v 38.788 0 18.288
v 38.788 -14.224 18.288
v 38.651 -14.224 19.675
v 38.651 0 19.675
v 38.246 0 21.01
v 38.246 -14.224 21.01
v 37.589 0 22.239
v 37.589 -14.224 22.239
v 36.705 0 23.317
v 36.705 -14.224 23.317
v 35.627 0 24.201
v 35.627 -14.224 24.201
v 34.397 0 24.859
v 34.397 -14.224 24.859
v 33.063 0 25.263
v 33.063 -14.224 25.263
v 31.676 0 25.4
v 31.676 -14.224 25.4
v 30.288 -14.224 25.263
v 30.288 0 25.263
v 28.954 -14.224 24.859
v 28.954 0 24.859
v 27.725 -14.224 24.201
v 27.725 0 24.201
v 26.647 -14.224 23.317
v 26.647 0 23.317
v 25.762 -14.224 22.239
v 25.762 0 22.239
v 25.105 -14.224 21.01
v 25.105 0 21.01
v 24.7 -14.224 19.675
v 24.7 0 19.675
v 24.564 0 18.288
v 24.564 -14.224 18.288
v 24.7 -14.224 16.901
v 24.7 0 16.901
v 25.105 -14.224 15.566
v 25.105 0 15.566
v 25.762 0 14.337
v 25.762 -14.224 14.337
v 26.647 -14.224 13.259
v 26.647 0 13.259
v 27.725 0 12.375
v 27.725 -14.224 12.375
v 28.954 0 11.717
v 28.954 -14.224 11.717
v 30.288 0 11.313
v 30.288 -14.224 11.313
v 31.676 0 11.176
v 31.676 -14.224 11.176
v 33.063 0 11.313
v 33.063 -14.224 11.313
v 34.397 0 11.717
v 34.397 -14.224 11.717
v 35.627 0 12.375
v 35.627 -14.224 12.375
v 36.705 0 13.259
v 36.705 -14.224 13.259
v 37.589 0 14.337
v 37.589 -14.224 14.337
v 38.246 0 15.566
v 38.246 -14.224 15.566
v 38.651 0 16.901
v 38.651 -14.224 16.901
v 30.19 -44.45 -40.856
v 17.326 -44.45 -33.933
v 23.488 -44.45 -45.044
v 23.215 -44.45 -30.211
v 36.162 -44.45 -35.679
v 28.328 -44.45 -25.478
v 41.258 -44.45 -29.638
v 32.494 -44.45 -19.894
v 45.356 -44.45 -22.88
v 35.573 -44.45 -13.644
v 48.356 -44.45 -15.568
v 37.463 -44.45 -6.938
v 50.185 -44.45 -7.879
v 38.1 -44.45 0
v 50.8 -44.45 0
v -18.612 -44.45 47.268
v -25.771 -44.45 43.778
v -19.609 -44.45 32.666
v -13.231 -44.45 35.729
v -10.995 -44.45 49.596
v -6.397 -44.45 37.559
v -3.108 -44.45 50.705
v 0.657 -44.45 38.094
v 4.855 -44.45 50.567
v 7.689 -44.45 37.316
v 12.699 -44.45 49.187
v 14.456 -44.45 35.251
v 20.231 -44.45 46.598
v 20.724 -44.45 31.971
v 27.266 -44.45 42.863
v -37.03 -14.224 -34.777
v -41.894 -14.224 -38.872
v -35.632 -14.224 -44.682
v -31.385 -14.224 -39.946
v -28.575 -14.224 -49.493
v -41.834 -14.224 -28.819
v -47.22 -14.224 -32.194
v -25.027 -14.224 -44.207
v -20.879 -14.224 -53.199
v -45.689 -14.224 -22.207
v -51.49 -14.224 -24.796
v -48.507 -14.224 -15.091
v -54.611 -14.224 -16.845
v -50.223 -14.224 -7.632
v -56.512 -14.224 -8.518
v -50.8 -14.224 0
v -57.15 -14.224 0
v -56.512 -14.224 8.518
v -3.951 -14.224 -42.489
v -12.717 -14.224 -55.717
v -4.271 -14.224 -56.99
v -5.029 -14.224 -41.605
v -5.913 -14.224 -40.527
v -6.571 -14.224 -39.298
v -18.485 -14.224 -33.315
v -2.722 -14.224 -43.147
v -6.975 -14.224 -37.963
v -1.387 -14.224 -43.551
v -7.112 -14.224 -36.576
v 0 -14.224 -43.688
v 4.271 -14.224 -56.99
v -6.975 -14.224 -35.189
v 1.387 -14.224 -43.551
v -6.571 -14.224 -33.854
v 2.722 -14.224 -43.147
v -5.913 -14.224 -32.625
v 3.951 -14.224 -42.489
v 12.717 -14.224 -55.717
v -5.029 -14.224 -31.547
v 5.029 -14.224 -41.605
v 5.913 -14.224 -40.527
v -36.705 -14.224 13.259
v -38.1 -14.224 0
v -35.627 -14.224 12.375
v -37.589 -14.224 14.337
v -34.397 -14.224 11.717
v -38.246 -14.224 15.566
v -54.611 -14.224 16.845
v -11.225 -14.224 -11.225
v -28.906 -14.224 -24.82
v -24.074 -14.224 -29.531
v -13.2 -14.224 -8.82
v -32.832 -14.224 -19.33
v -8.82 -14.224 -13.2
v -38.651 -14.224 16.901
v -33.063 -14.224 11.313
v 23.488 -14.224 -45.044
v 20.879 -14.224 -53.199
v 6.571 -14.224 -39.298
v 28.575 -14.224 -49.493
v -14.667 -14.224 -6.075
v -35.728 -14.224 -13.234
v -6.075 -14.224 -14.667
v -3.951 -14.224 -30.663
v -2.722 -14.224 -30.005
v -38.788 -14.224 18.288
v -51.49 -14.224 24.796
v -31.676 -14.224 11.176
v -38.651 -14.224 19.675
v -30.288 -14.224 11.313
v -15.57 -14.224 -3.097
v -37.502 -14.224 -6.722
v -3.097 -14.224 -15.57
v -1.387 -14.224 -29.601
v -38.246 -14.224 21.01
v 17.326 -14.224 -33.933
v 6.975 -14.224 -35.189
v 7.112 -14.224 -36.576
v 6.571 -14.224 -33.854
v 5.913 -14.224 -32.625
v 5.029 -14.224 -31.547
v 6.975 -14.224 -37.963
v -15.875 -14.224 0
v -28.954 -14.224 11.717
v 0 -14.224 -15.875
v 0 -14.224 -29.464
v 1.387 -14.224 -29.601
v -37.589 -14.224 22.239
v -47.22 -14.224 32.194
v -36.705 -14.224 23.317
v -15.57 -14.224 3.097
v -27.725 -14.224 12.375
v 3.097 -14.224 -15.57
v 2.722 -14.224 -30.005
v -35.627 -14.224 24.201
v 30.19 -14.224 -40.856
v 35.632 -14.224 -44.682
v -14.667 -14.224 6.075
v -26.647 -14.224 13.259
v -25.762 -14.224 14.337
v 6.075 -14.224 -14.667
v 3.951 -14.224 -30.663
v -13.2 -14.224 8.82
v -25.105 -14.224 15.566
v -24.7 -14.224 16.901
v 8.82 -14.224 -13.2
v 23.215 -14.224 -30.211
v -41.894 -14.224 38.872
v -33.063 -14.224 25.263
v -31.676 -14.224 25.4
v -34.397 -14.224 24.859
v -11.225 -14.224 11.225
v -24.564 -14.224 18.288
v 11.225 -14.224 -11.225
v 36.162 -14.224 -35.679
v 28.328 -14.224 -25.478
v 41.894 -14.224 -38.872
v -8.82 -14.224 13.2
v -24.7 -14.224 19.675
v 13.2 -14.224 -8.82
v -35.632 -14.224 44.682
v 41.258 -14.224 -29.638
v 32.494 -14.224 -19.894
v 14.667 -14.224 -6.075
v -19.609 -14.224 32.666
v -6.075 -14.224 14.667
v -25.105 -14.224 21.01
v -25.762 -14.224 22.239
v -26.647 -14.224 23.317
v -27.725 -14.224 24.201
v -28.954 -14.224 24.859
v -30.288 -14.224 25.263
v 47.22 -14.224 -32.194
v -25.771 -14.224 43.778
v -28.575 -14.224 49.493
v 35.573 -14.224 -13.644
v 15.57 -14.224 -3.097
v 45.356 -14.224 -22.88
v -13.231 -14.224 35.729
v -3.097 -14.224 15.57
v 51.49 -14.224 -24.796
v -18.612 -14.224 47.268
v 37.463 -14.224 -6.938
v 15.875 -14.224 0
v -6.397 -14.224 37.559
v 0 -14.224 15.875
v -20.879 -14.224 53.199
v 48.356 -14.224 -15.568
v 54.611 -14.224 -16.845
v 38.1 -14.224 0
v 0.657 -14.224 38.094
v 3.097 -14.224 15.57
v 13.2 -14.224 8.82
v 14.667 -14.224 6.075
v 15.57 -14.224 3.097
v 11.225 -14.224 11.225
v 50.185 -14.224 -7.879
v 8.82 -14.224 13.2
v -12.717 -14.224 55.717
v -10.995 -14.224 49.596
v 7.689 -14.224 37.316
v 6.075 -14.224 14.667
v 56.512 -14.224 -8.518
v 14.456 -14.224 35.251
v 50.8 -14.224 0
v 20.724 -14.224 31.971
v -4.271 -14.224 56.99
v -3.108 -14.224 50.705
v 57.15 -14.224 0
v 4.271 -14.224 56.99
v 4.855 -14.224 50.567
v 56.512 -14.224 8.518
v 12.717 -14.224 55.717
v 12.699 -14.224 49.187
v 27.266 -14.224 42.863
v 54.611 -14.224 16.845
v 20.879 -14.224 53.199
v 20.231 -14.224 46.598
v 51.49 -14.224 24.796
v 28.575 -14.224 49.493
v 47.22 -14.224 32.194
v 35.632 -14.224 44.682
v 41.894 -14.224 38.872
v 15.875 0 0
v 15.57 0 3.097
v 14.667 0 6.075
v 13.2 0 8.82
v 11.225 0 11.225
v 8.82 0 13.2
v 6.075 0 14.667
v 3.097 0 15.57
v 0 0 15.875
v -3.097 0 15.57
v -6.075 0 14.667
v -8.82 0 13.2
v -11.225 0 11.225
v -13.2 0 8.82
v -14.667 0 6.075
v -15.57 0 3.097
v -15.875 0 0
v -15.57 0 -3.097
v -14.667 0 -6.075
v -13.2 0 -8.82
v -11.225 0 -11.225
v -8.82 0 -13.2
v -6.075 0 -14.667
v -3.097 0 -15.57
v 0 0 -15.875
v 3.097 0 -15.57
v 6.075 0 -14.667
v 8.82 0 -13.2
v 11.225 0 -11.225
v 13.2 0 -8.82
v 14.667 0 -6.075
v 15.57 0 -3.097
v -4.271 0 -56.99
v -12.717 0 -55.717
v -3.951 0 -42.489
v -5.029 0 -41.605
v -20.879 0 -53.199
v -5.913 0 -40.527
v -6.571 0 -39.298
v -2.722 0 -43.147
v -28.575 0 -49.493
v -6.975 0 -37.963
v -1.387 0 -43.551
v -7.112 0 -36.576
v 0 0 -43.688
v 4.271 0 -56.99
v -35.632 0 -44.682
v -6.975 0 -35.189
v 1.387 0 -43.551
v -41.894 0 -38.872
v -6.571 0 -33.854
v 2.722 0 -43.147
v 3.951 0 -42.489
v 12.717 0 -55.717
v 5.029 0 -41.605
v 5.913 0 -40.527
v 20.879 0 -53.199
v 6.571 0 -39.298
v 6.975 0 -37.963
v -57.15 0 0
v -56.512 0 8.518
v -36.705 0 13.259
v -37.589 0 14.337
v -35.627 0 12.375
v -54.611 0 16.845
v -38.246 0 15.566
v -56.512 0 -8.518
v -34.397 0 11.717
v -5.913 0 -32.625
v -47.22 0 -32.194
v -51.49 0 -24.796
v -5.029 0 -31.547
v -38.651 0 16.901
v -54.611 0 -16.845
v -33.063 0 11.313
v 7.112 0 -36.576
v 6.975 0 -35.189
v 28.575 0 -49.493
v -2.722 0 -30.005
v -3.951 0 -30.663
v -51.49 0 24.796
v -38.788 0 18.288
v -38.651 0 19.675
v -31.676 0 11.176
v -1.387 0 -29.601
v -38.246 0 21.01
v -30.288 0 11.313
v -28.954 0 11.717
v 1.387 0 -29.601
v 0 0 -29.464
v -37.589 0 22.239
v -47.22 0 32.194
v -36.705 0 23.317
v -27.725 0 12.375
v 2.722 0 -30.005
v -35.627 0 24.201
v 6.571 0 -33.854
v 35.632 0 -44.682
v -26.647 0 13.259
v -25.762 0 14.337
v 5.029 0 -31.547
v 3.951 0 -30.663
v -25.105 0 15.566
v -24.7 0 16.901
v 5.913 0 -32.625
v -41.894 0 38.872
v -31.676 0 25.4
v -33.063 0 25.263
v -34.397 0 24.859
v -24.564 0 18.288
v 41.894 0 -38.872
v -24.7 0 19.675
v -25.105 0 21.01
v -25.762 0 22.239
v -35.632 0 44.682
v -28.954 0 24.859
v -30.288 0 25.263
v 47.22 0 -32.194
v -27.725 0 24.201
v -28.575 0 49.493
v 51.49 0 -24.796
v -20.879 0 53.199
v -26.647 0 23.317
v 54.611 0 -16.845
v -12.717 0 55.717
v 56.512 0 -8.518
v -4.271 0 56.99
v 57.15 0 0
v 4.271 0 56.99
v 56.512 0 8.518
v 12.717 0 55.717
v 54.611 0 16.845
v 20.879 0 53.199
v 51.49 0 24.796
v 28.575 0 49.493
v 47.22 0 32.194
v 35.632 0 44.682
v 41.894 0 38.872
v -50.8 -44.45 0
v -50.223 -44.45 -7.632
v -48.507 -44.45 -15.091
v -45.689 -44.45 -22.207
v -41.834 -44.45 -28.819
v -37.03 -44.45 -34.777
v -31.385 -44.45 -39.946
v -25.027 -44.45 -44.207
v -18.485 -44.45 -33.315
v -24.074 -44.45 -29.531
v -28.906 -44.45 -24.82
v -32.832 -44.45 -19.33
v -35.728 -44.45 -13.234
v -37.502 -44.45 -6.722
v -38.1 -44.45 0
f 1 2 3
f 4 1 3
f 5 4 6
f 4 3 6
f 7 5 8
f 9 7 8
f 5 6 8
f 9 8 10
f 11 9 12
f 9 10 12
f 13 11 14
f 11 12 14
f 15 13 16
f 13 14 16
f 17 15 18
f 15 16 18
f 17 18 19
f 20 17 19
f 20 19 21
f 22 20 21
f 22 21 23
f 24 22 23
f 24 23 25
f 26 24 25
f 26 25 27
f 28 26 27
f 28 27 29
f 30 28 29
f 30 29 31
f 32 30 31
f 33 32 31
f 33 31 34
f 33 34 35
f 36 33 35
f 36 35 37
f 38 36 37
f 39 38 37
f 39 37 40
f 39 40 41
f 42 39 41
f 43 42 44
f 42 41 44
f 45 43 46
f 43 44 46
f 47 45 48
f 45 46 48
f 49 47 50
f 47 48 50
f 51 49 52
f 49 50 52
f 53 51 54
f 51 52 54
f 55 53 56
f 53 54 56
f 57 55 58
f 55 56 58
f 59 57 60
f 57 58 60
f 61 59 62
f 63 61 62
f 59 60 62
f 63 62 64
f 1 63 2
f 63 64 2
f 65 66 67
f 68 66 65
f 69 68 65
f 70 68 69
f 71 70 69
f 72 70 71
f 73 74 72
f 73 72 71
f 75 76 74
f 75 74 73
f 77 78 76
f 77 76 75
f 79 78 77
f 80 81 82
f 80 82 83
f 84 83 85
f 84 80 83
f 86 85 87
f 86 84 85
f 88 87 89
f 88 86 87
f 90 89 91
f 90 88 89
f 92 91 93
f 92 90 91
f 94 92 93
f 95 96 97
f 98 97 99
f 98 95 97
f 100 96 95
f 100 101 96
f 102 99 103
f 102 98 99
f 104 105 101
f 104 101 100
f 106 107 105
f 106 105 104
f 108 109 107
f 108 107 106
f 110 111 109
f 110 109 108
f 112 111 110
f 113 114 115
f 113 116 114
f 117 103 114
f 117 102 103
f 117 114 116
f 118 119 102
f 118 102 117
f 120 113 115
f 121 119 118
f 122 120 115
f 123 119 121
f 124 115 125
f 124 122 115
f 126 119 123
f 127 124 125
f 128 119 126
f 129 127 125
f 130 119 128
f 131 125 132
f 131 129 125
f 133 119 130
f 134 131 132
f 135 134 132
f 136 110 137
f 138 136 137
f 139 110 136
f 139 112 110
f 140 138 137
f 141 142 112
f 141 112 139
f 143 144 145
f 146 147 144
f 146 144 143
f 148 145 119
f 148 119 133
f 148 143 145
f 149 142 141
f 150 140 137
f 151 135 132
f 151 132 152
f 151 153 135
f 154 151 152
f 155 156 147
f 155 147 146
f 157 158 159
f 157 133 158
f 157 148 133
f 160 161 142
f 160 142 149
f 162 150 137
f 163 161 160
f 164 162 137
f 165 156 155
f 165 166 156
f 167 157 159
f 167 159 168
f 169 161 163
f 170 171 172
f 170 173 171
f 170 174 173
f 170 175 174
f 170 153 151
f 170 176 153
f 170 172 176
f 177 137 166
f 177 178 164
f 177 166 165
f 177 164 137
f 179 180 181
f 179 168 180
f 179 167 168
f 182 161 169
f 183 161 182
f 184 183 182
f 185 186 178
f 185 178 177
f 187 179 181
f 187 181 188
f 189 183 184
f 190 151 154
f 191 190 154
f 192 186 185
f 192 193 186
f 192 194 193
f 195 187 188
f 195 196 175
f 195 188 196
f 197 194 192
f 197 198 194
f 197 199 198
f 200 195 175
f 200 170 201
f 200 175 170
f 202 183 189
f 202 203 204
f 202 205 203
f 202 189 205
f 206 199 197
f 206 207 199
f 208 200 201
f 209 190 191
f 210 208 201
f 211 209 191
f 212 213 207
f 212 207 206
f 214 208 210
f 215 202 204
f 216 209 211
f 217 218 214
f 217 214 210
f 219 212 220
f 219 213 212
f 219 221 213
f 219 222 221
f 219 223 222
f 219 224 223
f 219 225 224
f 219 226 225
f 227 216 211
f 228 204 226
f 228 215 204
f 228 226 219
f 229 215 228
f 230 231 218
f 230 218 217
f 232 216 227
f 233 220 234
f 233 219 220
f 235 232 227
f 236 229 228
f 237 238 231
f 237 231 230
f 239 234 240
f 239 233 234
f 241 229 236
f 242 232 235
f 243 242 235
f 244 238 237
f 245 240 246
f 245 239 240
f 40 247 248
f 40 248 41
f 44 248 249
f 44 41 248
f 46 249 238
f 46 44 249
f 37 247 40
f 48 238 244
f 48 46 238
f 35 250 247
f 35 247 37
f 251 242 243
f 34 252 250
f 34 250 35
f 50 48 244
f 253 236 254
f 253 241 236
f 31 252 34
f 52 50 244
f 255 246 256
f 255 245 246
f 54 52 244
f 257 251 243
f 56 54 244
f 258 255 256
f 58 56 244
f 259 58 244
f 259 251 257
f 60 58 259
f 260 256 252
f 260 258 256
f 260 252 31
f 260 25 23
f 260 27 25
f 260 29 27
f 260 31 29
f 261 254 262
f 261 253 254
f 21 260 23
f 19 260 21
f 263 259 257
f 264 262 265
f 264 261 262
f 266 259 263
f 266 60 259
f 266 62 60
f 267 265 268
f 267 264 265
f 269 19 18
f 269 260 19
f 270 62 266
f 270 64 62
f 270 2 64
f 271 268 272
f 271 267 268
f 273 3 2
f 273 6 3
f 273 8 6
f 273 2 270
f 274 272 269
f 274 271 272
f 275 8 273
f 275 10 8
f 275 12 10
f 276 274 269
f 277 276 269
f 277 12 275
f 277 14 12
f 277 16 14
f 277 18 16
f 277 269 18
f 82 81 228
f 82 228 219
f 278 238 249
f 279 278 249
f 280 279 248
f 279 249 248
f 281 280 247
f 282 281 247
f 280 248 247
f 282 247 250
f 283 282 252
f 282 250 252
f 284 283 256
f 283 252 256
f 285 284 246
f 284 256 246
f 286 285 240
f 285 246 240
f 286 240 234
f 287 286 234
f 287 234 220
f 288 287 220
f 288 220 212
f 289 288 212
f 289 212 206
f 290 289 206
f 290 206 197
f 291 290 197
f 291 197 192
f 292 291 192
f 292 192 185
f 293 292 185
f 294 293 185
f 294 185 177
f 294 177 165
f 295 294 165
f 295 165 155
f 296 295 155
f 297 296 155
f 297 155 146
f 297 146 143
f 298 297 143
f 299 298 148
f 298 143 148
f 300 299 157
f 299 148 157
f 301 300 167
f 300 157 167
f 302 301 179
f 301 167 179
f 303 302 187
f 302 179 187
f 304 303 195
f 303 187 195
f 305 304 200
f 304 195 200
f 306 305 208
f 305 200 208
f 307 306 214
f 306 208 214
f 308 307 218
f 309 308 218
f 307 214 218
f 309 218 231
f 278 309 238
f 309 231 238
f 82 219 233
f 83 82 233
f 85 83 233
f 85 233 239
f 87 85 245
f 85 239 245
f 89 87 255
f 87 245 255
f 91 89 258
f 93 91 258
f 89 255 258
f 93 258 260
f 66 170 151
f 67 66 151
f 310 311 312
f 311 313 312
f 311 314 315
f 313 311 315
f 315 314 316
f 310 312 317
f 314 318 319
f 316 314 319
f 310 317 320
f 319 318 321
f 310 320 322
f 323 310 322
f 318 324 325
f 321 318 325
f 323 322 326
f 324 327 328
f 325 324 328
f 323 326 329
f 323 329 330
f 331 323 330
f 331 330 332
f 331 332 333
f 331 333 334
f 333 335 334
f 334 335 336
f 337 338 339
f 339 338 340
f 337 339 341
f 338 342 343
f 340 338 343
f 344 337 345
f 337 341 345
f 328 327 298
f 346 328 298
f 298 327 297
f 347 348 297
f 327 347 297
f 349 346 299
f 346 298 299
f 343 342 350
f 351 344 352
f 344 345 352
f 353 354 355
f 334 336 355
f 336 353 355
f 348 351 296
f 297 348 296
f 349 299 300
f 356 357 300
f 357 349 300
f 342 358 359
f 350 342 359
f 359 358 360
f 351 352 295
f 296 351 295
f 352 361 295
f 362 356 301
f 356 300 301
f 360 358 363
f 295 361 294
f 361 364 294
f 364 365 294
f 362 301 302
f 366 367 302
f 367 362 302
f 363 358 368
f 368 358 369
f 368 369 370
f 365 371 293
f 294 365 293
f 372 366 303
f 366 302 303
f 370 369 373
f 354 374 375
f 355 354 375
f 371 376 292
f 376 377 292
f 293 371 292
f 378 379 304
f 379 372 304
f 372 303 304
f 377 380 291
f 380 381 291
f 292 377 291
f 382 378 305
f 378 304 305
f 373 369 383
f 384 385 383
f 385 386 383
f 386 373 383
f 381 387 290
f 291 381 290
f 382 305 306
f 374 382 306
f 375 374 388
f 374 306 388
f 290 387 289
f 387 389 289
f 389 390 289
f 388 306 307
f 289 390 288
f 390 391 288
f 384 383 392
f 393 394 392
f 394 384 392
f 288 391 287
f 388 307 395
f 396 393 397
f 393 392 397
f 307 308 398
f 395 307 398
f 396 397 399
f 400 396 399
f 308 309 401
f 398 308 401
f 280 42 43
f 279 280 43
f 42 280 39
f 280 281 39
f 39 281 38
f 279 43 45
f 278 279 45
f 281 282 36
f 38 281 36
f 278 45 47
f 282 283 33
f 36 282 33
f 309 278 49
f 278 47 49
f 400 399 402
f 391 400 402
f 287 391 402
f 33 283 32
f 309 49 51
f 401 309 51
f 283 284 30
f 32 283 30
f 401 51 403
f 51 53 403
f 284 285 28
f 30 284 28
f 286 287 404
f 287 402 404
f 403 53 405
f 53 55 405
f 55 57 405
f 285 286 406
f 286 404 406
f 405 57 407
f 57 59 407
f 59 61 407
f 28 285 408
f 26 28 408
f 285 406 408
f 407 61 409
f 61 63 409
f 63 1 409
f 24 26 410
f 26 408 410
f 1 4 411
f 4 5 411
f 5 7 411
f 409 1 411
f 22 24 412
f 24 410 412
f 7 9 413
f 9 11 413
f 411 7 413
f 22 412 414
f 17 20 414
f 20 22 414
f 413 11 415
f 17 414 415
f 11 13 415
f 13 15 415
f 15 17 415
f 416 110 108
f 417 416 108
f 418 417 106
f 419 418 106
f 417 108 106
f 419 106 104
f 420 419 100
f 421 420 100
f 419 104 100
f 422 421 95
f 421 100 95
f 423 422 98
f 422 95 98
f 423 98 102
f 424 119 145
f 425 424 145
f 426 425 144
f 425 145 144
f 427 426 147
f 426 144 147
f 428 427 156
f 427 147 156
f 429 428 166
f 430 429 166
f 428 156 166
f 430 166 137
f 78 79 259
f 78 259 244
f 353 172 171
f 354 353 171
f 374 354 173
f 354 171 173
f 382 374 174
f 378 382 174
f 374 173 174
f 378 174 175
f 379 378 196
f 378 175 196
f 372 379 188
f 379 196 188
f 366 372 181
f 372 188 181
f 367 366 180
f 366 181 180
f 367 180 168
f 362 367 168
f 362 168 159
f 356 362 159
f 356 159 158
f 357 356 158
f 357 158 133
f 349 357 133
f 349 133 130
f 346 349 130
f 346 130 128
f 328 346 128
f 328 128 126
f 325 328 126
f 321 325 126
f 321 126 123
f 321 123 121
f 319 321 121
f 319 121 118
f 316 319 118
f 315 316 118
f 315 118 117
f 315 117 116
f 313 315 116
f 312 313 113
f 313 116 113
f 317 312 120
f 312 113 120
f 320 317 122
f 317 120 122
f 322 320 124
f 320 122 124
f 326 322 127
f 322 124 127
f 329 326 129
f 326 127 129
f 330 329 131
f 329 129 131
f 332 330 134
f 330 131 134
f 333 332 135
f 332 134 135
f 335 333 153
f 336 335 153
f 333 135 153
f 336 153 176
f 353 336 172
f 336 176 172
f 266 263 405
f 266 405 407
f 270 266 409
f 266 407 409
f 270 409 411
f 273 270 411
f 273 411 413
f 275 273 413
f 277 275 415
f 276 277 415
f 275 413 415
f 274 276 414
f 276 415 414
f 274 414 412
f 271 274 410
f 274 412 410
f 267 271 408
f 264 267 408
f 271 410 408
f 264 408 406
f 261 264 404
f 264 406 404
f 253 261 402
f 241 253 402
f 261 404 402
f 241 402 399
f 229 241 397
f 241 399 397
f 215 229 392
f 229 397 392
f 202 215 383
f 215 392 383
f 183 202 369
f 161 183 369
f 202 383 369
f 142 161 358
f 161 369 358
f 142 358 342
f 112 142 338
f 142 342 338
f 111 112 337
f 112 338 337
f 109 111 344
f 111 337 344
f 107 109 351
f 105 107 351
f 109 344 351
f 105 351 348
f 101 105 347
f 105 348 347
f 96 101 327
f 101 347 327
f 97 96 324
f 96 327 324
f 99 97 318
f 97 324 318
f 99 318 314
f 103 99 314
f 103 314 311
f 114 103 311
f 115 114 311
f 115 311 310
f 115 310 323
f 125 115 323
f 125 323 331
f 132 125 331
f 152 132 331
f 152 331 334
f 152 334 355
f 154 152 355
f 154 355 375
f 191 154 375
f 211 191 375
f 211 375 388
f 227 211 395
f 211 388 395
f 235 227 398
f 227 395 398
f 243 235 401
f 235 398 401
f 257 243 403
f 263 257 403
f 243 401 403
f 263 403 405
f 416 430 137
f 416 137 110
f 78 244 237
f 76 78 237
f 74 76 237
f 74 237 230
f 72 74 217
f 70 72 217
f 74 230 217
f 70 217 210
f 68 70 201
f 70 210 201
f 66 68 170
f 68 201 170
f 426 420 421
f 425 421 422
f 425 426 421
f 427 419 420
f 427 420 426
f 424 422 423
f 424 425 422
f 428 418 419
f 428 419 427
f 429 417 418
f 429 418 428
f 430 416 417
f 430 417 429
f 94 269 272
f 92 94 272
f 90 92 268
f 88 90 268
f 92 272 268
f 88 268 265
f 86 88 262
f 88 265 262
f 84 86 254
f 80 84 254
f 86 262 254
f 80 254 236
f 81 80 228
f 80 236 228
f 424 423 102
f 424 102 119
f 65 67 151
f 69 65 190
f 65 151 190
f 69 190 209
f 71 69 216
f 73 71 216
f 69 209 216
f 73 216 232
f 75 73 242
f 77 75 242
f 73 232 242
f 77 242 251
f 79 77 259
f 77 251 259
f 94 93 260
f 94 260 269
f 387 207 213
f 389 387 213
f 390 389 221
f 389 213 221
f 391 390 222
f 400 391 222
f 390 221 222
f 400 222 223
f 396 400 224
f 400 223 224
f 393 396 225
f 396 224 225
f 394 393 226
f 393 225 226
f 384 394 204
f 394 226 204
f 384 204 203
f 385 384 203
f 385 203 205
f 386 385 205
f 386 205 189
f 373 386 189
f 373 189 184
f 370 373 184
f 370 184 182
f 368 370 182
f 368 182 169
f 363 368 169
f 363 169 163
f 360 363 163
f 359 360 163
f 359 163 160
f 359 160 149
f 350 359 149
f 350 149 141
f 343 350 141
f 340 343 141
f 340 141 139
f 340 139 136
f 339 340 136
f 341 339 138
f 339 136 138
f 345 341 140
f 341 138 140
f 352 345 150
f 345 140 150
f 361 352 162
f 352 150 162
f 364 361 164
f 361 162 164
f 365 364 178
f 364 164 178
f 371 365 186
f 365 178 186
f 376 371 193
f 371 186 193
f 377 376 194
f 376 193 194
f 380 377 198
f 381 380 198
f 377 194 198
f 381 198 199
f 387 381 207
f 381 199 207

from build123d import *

# Parameters (mm, degrees)
F0_R     = 57.15
F1_DEPTH = 14.224
F2_R     = 15.875
F3_DEPTH = 14.225
F4_R     = 7.112
F5_DEPTH = 14.225
F7_DEPTH = 30.226


with BuildPart() as f1:
    # F0 (on Front) → F1 (new body)
    with BuildSketch(Plane.XZ):
        Circle(F0_R)
    extrude(amount=F1_DEPTH)

    # F2 (on face) → F3 (cut, through all)
    with BuildSketch(Plane.XZ.offset(14.224)):
        Circle(F2_R)
    extrude(amount=-F3_DEPTH, mode=Mode.SUBTRACT)

    # F4 (on face) → F5 (cut, through all)
    with BuildSketch(Plane.XZ.offset(14.224)):
        with Locations((0, -36.576)):
            Circle(F4_R)
        with Locations((31.675745, 18.288)):
            Circle(F4_R)
        with Locations((-31.675745, 18.288)):
            Circle(F4_R)
    extrude(amount=-F5_DEPTH, mode=Mode.SUBTRACT)

    # F6 (on face) → F7 (join)
    with BuildSketch(Plane.XZ.offset(14.224)):
        with BuildLine():
            ThreePointArc((-18.485466, -33.315125), (-32.832196, -19.330206), (-38.1, 0))
            Line((-38.1, 0), (-50.8, 0))
            ThreePointArc((-50.8, 0), (-43.886307, -25.585779), (-25.027083, -44.207297))
            Line((-25.027083, -44.207297), (-18.485466, -33.315125))
        make_face()
        with BuildLine():
            Line((50.8, 0), (38.1, 0))
            ThreePointArc((38.1, 0), (32.493945, -19.893555), (17.325537, -33.932813))
            Line((17.325537, -33.932812), (23.487626, -45.044105))
            ThreePointArc((23.487626, -45.044105), (43.438528, -26.338836), (50.8, 0))
        make_face()
        with BuildLine():
            Line((20.723909, 31.970762), (27.265526, 42.862934))
            ThreePointArc((27.265526, 42.862934), (0.876096, 50.792445), (-25.771101, 43.777738))
            Line((-25.771101, 43.777738), (-19.609012, 32.666446))
            ThreePointArc((-19.609012, 32.666446), (0.657072, 38.094334), (20.723909, 31.970762))
        make_face()
    extrude(amount=F7_DEPTH)


solid = f1.part
